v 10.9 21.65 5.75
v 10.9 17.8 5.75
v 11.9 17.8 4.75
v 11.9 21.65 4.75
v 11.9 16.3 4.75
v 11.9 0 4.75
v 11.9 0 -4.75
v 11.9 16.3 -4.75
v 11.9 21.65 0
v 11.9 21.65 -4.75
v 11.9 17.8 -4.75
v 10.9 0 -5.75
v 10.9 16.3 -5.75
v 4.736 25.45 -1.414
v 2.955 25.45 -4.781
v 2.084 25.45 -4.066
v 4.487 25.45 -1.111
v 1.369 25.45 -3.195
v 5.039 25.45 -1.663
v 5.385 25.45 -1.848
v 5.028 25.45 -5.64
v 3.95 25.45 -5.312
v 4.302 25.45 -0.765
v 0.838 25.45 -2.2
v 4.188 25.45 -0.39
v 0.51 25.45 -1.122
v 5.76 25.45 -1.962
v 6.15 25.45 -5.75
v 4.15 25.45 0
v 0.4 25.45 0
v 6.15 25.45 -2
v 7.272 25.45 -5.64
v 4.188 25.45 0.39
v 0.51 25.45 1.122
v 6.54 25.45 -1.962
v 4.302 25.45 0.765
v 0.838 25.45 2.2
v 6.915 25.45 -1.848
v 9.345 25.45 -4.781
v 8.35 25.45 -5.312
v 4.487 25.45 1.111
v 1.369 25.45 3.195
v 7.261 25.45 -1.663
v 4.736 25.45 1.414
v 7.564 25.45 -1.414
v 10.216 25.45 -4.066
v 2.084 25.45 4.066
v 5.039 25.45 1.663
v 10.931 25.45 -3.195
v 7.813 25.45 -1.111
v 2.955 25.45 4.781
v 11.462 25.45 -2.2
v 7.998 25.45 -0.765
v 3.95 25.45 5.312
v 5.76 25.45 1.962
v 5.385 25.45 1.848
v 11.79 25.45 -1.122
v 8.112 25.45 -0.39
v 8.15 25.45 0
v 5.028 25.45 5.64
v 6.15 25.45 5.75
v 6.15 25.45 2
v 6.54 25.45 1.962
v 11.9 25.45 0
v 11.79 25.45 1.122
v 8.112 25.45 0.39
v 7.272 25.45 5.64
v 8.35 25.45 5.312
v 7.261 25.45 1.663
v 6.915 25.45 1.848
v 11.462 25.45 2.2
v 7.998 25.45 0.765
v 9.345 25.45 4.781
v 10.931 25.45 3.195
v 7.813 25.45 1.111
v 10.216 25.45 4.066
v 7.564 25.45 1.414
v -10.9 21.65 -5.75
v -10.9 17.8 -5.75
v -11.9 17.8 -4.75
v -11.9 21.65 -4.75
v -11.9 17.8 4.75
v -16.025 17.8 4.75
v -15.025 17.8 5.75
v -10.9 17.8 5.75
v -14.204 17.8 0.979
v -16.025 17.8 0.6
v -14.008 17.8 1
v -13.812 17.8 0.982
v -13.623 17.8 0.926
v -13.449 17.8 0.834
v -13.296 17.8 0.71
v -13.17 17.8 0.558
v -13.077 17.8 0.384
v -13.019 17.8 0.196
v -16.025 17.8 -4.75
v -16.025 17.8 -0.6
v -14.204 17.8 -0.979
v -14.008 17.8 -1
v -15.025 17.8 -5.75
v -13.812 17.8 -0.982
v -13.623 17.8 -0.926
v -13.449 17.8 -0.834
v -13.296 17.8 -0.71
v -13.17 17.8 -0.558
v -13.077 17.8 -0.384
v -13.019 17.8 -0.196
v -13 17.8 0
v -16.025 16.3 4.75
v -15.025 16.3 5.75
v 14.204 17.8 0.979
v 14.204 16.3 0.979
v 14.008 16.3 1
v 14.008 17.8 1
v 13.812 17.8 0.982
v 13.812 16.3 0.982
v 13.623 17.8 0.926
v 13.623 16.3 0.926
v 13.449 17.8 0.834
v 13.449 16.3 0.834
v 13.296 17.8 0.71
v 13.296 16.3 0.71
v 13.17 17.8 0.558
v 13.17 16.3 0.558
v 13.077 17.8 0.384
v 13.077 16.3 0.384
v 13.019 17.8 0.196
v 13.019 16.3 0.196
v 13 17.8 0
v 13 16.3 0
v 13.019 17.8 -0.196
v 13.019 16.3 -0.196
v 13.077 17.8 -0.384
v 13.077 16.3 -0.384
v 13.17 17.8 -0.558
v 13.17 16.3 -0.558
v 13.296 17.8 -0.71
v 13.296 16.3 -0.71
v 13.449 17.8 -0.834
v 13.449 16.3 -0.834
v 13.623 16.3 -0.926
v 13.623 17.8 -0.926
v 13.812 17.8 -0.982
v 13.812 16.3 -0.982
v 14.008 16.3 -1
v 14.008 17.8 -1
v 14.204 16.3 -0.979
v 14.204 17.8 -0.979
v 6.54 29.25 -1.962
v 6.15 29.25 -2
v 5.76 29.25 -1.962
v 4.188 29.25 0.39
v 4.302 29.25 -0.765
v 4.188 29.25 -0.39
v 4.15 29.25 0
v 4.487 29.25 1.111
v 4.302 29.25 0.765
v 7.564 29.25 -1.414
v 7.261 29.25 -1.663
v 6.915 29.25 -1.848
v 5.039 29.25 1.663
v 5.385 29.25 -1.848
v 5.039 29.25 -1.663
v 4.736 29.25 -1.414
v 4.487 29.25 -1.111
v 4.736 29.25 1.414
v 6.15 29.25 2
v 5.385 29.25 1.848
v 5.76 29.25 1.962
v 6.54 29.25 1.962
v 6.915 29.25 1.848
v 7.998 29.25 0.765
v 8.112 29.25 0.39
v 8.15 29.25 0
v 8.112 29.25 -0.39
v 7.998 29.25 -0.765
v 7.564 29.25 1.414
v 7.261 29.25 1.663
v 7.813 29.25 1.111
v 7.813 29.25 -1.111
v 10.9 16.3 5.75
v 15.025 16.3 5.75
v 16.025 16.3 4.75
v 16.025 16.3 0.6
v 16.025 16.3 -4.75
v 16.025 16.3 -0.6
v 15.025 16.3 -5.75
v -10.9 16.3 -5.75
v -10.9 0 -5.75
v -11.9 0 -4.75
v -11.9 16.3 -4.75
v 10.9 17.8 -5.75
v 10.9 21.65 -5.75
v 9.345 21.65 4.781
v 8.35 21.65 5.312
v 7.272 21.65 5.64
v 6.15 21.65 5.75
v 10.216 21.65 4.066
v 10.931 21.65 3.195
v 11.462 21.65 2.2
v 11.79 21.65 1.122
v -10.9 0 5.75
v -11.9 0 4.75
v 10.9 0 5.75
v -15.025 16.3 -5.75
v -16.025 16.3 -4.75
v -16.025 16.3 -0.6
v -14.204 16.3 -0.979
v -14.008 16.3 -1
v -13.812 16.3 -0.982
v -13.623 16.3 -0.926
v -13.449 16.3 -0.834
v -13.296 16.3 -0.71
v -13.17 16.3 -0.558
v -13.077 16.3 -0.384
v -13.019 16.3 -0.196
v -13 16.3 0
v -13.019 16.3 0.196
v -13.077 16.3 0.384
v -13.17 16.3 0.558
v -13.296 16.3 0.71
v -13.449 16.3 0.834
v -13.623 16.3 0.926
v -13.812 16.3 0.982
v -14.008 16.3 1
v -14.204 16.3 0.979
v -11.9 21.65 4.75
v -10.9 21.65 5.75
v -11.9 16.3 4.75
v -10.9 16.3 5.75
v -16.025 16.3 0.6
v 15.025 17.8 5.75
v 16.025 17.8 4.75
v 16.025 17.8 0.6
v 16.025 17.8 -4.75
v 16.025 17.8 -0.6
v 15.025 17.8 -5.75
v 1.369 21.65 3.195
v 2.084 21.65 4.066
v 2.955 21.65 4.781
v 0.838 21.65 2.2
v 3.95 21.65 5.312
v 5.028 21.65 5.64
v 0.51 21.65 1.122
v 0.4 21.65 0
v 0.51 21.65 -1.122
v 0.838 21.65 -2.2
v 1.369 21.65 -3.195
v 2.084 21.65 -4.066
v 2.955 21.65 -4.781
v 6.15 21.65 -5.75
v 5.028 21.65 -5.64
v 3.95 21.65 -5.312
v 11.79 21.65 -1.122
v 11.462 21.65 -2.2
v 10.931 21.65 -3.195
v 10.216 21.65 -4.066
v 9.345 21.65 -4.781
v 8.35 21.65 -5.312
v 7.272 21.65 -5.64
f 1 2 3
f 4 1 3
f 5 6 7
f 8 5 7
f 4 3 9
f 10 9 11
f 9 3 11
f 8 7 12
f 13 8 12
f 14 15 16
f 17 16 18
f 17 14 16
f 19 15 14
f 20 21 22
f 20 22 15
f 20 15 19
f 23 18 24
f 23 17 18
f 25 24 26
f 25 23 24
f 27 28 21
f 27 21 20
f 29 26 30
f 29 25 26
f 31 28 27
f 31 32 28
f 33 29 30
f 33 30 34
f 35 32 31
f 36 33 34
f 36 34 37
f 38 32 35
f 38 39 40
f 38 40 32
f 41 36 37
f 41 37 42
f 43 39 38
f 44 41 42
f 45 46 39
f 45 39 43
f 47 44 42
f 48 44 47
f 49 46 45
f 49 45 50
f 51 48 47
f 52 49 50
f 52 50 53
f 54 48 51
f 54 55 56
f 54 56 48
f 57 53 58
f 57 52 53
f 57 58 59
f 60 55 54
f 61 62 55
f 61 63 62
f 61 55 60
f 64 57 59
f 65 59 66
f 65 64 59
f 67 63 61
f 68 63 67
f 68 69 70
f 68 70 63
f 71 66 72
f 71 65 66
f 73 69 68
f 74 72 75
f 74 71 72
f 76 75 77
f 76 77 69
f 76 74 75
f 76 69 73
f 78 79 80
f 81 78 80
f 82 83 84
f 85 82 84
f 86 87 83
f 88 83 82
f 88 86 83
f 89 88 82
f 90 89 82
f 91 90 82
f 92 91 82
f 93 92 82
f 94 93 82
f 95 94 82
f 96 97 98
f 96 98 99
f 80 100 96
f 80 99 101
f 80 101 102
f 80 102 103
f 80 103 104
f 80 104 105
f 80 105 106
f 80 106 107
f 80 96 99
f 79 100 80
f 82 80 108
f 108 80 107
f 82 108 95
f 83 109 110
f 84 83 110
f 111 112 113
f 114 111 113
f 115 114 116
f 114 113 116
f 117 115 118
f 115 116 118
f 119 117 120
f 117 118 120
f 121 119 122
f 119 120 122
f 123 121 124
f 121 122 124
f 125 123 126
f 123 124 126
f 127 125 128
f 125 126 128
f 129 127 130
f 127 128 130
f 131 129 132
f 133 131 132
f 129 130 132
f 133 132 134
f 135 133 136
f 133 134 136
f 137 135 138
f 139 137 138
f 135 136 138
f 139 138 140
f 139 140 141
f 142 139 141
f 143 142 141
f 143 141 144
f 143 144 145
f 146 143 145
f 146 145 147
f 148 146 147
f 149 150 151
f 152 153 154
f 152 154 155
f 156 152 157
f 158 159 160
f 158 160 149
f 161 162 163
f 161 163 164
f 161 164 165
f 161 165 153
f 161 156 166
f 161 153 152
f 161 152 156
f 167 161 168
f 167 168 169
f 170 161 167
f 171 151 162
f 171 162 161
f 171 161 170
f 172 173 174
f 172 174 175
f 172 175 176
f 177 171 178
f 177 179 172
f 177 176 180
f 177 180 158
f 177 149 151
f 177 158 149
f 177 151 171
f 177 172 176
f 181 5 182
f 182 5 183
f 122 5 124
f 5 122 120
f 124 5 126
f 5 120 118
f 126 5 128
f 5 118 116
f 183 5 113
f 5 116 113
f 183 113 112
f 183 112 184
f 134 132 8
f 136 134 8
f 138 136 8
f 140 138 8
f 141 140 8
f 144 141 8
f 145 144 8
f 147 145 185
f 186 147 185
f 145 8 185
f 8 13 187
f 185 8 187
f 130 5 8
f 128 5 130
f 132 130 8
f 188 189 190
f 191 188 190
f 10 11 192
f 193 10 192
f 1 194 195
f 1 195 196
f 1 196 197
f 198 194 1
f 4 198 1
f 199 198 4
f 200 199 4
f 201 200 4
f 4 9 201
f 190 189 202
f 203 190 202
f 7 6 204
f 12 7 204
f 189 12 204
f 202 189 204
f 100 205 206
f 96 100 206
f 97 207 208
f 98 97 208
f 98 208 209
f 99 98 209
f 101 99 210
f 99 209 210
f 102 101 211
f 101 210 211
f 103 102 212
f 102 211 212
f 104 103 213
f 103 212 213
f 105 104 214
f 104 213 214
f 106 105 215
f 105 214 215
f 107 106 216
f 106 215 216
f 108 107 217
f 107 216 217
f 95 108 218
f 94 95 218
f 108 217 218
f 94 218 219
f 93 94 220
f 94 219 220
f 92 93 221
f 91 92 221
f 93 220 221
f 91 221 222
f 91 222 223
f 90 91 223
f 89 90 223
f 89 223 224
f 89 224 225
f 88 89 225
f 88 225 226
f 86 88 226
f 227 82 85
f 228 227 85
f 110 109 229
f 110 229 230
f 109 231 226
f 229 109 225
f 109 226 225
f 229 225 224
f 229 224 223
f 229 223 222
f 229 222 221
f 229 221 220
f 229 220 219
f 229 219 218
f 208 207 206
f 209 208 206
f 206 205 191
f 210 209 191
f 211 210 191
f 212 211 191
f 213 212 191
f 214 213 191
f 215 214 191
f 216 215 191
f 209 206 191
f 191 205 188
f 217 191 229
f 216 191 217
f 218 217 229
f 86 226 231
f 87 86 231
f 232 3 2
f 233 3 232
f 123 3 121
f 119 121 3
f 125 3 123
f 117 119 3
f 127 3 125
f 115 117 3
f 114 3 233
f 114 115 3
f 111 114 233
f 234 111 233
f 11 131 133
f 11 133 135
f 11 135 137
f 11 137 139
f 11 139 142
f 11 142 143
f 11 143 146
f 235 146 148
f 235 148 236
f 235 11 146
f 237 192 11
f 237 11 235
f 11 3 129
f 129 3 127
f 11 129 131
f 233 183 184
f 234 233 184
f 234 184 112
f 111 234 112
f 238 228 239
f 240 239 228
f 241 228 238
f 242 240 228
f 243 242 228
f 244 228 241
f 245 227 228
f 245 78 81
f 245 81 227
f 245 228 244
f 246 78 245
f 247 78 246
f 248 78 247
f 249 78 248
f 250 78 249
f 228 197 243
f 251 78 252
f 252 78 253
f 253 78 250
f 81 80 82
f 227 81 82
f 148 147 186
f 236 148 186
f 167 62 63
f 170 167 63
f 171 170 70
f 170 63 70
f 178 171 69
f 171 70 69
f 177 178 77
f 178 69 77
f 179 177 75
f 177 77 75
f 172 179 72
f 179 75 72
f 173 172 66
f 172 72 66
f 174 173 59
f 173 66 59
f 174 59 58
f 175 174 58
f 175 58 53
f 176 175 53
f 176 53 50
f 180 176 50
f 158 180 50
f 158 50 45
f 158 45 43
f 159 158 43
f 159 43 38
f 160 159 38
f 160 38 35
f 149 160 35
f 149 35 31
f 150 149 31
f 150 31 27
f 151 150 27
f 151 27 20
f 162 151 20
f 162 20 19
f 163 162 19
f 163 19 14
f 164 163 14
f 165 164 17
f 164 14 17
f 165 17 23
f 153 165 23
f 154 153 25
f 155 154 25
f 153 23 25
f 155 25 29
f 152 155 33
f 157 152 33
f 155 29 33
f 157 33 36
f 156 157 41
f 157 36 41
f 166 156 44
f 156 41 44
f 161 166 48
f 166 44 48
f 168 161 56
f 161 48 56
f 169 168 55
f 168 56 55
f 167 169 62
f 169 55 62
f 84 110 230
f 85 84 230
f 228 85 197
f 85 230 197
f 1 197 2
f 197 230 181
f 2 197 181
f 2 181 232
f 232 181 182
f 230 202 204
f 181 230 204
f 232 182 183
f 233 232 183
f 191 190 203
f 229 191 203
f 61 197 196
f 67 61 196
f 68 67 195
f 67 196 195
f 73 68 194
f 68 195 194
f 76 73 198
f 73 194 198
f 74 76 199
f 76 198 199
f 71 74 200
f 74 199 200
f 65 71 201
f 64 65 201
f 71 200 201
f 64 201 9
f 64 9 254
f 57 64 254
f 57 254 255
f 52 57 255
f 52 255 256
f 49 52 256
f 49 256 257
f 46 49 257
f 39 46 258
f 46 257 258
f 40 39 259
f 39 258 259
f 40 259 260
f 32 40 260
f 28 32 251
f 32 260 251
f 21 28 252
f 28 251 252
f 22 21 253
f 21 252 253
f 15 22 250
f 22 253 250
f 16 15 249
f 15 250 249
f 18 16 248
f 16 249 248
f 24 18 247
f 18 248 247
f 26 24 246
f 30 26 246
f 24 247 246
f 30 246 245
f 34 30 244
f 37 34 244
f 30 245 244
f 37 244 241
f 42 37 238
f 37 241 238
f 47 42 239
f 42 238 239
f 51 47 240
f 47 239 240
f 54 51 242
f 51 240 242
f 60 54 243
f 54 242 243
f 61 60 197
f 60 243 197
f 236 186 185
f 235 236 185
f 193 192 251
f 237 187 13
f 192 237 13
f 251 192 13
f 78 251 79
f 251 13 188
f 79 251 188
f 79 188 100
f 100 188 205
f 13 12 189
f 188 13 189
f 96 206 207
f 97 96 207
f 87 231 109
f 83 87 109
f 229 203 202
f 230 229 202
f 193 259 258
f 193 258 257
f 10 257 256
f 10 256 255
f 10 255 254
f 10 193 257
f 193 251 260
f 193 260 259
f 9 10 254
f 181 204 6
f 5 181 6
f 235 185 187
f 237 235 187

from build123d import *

# Parameters (mm, degrees)
BOSS_EXTRUDE1_DEPTH = 21.65
SKETCH1_3_R         = 5.75
BOSS_EXTRUDE2_DEPTH = 25.45
SKETCH1_4_R         = 2
BOSS_EXTRUDE3_DEPTH = 29.25
BOSS_EXTRUDE4_START = 16.3
BOSS_EXTRUDE4_DEPTH = 1.5


with BuildPart() as part:
    # Sketch1 → Boss-Extrude1 (new body)
    with BuildSketch(Plane(origin=(0, 0, 0), x_dir=(1, 0, 0), z_dir=(0, 1, 0))):
        Polygon((-10.9, -5.75), (10.9, -5.75), (11.9, -4.75), (11.9, 4.75), (10.9, 5.75), (-10.9, 5.75), (-11.9, 4.75), (-11.9, -4.75), align=None)
    extrude(amount=BOSS_EXTRUDE1_DEPTH)

    # Sketch1<3> → Boss-Extrude2 (add)
    with BuildSketch(Plane(origin=(0, 0, 0), x_dir=(1, 0, 0), z_dir=(0, 1, 0))):
        with Locations((6.15, 0)):
            Circle(SKETCH1_3_R)
    extrude(amount=BOSS_EXTRUDE2_DEPTH)

    # Sketch1<4> → Boss-Extrude3 (add)
    with BuildSketch(Plane(origin=(0, 0, 0), x_dir=(1, 0, 0), z_dir=(0, 1, 0))):
        with Locations((6.15, 0)):
            Circle(SKETCH1_4_R)
    extrude(amount=BOSS_EXTRUDE3_DEPTH)

    # Sketch1<5> → Boss-Extrude4 (add)
    with BuildSketch(Plane(origin=(0, 0, 0), x_dir=(1, 0, 0), z_dir=(0, 1, 0)).offset(BOSS_EXTRUDE4_START)):
        with BuildLine():
            Line((-15.025, -5.75), (-10.9, -5.75))
            Line((-10.9, -5.75), (-11.9, -4.75))
            Line((-11.9, -4.75), (-11.9, 4.75))
            Line((-11.9, 4.75), (-10.9, 5.75))
            Line((-10.9, 5.75), (-15.025, 5.75))
            Line((-15.025, 5.75), (-16.025, 4.75))
            Line((-16.025, 4.75), (-16.025, 0.6))
            Line((-16.025, 0.6), (-14.203746042, 0.979023774))
            ThreePointArc((-14.203746042, 0.979023774), (-13, 0), (-14.203746042, -0.979023774))
            Line((-14.203746042, -0.979023774), (-16.025, -0.6))
            Line((-16.025, -0.6), (-16.025, -4.75))
            Line((-16.025, -4.75), (-15.025, -5.75))
        make_face()
        with BuildLine():
            Line((11.9, -4.75), (10.9, -5.75))
            Line((10.9, -5.75), (15.025, -5.75))
            Line((15.025, -5.75), (16.025, -4.75))
            Line((16.025, -4.75), (16.025, -0.6))
            Line((16.025, -0.6), (14.203746042, -0.979023774))
            ThreePointArc((14.203746042, -0.979023774), (13, 0), (14.203746042, 0.979023774))
            Line((14.203746042, 0.979023774), (16.025, 0.6))
            Line((16.025, 0.6), (16.025, 4.75))
            Line((16.025, 4.75), (15.025, 5.75))
            Line((15.025, 5.75), (10.9, 5.75))
            Line((10.9, 5.75), (11.9, 4.75))
            Line((11.9, 4.75), (11.9, -4.75))
        make_face()
    extrude(amount=BOSS_EXTRUDE4_DEPTH)


solid = part.part
